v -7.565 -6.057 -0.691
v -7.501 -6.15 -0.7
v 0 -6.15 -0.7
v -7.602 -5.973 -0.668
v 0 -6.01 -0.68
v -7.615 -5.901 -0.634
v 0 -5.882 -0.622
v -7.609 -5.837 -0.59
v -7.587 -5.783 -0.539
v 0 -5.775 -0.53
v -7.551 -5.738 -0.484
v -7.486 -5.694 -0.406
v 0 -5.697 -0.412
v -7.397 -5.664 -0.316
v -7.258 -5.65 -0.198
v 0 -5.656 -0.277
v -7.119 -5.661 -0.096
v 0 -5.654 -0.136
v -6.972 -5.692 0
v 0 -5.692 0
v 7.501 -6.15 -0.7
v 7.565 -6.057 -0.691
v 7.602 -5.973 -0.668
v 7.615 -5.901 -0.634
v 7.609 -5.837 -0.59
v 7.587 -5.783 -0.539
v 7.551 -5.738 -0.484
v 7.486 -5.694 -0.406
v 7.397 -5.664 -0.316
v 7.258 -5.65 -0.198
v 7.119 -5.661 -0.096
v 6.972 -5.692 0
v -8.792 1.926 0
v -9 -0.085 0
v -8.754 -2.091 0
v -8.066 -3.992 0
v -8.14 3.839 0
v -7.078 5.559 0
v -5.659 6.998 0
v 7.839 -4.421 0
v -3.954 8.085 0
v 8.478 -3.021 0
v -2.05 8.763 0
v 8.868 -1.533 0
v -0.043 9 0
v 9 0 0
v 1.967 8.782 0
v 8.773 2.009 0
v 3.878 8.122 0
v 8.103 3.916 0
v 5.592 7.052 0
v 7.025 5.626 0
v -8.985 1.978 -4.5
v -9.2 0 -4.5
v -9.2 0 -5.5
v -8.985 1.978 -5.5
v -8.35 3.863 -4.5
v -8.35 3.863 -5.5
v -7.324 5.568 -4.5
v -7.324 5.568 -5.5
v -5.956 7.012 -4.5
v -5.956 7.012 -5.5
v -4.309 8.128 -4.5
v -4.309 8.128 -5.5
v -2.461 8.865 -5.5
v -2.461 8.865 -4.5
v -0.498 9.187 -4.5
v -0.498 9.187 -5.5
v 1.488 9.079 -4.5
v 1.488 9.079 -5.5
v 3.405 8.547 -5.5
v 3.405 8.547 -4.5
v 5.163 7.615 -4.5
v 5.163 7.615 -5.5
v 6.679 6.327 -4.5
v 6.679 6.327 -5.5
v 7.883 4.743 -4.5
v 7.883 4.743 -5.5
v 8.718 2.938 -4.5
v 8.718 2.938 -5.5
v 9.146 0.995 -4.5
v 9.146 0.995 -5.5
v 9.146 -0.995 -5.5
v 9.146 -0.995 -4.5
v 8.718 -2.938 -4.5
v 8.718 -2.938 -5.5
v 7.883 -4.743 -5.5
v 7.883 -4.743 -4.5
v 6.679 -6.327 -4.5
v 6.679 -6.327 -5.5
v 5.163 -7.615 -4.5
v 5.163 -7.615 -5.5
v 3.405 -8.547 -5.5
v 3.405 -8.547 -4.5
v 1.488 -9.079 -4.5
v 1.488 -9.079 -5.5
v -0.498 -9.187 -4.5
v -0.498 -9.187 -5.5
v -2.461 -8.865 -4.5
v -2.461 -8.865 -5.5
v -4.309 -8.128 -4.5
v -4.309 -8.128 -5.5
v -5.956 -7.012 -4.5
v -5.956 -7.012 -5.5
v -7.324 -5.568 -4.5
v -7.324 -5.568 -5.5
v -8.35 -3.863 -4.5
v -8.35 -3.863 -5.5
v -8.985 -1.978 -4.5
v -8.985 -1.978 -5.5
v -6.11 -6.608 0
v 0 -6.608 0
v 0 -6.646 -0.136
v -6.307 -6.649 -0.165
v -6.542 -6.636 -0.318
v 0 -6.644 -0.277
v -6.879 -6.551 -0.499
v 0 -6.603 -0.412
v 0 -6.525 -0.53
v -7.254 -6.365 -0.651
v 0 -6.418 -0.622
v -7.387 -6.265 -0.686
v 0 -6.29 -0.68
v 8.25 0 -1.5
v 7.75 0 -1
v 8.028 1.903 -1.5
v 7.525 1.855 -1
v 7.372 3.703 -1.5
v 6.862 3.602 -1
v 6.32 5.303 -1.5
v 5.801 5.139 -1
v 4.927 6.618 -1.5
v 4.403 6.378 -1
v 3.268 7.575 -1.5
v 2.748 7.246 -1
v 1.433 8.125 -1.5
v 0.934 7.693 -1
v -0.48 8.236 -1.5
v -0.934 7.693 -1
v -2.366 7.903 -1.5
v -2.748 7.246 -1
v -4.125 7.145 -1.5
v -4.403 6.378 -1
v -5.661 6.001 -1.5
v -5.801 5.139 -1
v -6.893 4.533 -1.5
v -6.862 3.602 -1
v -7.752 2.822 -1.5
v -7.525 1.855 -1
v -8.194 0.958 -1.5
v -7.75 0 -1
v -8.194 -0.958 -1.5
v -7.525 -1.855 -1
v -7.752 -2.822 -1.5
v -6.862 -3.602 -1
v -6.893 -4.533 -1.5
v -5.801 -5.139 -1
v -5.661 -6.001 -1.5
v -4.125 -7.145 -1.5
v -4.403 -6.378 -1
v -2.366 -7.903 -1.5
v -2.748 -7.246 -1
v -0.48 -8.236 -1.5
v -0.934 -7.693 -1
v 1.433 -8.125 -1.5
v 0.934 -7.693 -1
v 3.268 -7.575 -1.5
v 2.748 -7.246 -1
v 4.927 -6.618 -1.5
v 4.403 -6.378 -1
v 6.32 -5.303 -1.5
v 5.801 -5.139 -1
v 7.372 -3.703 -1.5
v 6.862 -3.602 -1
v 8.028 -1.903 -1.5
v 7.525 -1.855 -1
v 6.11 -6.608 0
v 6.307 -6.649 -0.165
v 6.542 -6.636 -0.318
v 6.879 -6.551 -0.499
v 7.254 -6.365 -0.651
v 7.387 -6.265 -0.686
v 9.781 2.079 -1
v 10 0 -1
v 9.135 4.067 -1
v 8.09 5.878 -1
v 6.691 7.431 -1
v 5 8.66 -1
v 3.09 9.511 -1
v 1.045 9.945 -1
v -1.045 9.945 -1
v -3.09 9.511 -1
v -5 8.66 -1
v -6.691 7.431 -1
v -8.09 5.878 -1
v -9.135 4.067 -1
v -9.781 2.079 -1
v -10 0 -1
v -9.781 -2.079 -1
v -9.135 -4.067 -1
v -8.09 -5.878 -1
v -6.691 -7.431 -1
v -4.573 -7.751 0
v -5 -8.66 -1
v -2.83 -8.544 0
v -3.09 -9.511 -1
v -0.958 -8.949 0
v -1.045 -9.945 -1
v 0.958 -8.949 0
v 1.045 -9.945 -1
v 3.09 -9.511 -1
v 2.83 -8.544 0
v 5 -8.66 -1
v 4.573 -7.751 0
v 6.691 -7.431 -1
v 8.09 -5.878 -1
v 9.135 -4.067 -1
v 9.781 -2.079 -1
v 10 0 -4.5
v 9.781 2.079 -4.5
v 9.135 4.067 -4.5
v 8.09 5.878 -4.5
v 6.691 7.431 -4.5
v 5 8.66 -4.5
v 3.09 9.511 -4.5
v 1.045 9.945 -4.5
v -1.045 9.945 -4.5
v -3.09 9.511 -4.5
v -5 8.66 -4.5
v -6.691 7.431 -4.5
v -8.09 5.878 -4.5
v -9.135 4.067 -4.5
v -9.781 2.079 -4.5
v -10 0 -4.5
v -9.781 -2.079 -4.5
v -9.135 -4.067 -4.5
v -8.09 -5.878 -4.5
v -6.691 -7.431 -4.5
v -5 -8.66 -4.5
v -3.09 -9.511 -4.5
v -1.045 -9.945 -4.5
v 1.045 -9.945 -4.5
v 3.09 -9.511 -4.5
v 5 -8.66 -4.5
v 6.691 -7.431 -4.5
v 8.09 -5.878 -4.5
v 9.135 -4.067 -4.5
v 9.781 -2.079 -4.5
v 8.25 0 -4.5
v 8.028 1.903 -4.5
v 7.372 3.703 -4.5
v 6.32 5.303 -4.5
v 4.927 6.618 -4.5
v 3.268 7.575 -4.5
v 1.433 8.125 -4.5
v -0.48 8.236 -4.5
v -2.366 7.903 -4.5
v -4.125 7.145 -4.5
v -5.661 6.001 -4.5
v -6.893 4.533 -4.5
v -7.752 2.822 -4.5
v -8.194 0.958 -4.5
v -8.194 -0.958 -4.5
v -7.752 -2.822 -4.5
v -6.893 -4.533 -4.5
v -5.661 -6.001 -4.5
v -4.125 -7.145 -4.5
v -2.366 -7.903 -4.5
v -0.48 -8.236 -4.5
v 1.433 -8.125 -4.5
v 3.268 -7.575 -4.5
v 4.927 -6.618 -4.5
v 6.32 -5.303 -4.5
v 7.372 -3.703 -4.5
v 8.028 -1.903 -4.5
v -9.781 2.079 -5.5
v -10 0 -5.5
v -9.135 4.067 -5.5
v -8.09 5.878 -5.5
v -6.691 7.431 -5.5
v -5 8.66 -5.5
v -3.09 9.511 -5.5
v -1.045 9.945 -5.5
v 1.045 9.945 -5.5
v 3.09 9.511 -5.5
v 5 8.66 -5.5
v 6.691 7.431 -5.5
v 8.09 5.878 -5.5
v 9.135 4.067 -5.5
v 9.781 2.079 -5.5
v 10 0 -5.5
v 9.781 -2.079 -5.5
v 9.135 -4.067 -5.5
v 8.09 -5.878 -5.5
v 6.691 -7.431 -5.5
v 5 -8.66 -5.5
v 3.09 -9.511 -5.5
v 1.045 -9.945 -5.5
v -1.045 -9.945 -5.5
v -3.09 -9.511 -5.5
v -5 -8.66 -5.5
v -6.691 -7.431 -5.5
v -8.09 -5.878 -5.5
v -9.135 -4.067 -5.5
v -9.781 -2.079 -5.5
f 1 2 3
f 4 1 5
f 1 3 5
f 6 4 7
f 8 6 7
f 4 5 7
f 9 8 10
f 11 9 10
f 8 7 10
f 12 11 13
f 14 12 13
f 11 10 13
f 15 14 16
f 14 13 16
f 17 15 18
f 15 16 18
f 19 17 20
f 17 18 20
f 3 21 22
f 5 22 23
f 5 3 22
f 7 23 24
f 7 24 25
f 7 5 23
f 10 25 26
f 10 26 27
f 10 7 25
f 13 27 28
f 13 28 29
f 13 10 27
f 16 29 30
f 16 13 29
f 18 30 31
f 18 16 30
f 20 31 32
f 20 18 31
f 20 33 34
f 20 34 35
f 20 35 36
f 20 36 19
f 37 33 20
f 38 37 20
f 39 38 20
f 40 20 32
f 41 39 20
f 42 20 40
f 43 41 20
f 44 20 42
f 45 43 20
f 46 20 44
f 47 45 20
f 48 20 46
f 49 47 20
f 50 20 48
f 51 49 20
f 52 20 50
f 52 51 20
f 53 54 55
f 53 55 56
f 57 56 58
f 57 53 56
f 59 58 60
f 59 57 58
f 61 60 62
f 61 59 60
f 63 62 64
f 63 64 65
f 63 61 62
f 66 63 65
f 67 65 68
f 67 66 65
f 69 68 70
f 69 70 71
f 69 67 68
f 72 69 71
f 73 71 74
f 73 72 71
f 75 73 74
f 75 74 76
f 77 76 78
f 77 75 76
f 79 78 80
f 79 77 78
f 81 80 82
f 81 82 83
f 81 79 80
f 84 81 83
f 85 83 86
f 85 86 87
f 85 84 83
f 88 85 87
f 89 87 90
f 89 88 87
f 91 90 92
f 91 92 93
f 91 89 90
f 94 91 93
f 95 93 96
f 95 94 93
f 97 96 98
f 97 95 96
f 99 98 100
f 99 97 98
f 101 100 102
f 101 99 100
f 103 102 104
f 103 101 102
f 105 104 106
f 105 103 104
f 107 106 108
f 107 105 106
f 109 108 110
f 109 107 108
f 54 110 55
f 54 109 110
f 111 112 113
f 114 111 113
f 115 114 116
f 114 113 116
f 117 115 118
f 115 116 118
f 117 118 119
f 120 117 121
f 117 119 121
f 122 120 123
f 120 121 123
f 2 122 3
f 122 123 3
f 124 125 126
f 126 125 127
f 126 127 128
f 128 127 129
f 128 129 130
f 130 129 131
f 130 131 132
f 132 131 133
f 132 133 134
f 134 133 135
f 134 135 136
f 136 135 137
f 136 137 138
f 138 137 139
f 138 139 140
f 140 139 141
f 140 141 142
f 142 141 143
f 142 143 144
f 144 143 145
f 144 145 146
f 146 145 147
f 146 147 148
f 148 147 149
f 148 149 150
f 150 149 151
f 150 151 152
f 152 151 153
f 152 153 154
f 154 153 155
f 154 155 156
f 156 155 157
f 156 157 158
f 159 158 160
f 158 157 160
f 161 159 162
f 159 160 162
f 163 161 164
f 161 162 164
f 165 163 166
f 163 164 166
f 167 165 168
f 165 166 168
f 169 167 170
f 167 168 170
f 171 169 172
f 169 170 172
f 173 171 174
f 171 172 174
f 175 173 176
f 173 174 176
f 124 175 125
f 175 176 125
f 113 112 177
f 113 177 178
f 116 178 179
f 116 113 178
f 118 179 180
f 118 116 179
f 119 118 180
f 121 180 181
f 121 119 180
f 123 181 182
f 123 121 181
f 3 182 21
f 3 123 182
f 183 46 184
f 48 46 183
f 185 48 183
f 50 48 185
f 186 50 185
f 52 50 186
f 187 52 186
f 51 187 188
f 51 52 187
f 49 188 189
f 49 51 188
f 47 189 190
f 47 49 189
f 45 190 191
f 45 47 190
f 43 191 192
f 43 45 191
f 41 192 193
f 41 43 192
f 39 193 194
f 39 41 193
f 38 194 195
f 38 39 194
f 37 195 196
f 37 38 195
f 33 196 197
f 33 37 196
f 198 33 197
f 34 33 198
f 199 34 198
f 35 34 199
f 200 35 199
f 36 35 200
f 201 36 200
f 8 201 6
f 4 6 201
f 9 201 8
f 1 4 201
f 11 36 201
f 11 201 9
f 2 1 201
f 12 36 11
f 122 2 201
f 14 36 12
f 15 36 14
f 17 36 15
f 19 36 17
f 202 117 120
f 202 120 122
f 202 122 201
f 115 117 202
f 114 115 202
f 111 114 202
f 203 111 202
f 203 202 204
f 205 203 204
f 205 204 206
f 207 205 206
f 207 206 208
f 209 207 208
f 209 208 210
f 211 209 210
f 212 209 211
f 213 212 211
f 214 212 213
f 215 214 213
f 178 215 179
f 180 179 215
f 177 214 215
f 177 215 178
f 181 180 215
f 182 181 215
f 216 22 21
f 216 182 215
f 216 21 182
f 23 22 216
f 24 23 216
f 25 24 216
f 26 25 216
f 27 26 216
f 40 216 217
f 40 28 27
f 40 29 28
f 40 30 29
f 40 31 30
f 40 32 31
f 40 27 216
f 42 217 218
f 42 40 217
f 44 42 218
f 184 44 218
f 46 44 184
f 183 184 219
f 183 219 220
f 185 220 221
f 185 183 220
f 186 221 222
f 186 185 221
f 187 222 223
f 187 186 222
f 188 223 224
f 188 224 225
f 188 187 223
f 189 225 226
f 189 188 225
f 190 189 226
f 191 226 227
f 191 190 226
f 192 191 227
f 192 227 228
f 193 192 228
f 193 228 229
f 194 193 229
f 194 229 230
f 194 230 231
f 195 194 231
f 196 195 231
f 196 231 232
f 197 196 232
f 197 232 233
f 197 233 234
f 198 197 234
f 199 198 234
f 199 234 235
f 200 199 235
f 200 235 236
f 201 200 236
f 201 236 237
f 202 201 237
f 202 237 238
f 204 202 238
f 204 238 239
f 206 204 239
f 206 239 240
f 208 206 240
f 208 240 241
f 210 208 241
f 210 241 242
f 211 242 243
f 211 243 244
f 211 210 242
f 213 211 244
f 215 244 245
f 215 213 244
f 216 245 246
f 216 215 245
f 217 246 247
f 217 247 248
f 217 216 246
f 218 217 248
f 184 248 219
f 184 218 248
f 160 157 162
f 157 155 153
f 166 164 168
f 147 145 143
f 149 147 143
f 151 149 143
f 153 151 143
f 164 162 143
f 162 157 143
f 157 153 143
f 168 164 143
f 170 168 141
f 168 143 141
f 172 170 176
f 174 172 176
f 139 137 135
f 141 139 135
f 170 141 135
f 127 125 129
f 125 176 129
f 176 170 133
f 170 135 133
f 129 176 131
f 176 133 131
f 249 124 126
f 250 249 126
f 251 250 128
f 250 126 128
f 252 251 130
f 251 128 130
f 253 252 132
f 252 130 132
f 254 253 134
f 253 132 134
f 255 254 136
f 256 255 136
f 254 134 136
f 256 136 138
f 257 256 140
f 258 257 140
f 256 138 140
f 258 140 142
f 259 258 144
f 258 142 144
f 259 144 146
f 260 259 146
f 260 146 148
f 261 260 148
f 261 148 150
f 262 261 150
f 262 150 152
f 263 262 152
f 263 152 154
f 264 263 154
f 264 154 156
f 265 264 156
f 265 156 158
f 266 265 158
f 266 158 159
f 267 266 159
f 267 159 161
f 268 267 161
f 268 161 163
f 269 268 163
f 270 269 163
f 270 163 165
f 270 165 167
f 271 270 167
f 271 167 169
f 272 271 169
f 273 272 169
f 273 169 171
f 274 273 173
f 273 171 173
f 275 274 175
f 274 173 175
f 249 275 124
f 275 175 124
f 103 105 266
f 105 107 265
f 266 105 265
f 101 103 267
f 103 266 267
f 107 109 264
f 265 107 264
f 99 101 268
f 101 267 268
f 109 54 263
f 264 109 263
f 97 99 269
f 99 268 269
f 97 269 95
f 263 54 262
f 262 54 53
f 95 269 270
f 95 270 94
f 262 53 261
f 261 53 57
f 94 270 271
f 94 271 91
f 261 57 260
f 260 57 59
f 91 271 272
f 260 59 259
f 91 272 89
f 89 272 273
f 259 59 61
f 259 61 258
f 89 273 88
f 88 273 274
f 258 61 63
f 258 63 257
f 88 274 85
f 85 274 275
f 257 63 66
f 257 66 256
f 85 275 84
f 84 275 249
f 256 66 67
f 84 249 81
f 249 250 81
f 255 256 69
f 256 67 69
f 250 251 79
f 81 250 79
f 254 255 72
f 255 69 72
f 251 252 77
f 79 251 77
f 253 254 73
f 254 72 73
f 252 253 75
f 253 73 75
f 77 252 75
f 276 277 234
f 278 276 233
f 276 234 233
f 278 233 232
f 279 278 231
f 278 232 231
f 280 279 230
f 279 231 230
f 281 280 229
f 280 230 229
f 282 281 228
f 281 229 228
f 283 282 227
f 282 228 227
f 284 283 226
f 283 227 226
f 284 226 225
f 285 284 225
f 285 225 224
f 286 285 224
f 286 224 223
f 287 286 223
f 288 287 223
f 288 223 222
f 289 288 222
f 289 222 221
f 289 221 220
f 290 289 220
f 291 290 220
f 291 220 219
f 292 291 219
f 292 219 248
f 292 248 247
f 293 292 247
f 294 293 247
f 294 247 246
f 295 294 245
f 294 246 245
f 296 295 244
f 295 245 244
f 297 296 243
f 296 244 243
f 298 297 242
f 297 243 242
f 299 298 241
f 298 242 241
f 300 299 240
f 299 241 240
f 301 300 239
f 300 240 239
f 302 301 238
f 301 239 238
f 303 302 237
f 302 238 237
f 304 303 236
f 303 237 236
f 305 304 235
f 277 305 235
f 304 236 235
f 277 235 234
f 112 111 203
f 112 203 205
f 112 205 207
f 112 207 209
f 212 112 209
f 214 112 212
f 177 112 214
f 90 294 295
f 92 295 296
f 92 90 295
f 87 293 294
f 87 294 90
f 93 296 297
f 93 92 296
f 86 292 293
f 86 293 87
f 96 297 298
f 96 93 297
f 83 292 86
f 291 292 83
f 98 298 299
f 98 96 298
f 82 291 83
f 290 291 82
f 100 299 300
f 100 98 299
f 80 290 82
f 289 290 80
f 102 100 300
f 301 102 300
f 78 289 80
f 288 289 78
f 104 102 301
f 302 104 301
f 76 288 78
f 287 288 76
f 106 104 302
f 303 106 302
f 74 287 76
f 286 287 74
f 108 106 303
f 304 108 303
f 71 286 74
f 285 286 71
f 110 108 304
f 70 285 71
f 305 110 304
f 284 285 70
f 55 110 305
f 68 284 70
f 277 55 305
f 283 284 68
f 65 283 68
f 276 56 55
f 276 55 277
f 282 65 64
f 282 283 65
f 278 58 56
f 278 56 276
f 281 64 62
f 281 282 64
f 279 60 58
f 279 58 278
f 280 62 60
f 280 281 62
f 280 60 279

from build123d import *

# Parameters (mm, degrees)
SKETCH1_R               = 10
SKETCH1_R_2             = 8.25
BOSS_EXTRUDE1_DEPTH     = 4.5
SKETCH1_3_R             = 8.25
BOSS_EXTRUDE2_DEPTH     = 1
SKETCH2_R               = 10
SKETCH2_R_2             = 9.2
BOSS_EXTRUDE3_DEPTH     = 1
CHAMFER1_SIZE           = 1
CHAMFER2_SIZE           = 0.5
SKETCH4_R               = 0.5
CUT_EXTRUDE3_DEPTH      = 11
CUT_EXTRUDE3_DEPTH_BACK = 11


with BuildPart() as part:
    # Sketch1 → Boss-Extrude1 (new body)
    with BuildSketch(Plane.XY):
        Circle(SKETCH1_R)
        Circle(SKETCH1_R_2, mode=Mode.SUBTRACT)
    extrude(amount=-BOSS_EXTRUDE1_DEPTH)

    # Sketch1<3> → Boss-Extrude2 (add)
    with BuildSketch(Plane.XY):
        Circle(SKETCH1_3_R)
    extrude(amount=-BOSS_EXTRUDE2_DEPTH)

    # Sketch2 → Boss-Extrude3 (add)
    with BuildSketch(Plane(origin=(0, 0, -4.5), x_dir=(-1, 0, 0), z_dir=(0, 0, -1))):
        Circle(SKETCH2_R)
        Circle(SKETCH2_R_2, mode=Mode.SUBTRACT)
    extrude(amount=BOSS_EXTRUDE3_DEPTH)

    # Chamfer1
    chamfer1_edges = [part.edges().sort_by_distance(p)[0] for p in [
        (-10, 0, 0),
    ]]
    chamfer(chamfer1_edges, length=CHAMFER1_SIZE)

    # Chamfer2
    chamfer2_edges = [part.edges().sort_by_distance(p)[0] for p in [
        (-8.25, 0, -1),
    ]]
    chamfer(chamfer2_edges, length=CHAMFER2_SIZE)

    # Sketch4 → Cut-Extrude3 (cut, two sides)
    with BuildSketch(Plane(origin=(0, 0, 0), x_dir=(0, 0, -1), z_dir=(1, 0, 0))) as cut_extrude3_sk:
        with Locations((0.2, -6.15)):
            Circle(SKETCH4_R)
    extrude(amount=CUT_EXTRUDE3_DEPTH, mode=Mode.SUBTRACT)
    extrude(cut_extrude3_sk.sketch, amount=-CUT_EXTRUDE3_DEPTH_BACK, mode=Mode.SUBTRACT)


solid = part.part
